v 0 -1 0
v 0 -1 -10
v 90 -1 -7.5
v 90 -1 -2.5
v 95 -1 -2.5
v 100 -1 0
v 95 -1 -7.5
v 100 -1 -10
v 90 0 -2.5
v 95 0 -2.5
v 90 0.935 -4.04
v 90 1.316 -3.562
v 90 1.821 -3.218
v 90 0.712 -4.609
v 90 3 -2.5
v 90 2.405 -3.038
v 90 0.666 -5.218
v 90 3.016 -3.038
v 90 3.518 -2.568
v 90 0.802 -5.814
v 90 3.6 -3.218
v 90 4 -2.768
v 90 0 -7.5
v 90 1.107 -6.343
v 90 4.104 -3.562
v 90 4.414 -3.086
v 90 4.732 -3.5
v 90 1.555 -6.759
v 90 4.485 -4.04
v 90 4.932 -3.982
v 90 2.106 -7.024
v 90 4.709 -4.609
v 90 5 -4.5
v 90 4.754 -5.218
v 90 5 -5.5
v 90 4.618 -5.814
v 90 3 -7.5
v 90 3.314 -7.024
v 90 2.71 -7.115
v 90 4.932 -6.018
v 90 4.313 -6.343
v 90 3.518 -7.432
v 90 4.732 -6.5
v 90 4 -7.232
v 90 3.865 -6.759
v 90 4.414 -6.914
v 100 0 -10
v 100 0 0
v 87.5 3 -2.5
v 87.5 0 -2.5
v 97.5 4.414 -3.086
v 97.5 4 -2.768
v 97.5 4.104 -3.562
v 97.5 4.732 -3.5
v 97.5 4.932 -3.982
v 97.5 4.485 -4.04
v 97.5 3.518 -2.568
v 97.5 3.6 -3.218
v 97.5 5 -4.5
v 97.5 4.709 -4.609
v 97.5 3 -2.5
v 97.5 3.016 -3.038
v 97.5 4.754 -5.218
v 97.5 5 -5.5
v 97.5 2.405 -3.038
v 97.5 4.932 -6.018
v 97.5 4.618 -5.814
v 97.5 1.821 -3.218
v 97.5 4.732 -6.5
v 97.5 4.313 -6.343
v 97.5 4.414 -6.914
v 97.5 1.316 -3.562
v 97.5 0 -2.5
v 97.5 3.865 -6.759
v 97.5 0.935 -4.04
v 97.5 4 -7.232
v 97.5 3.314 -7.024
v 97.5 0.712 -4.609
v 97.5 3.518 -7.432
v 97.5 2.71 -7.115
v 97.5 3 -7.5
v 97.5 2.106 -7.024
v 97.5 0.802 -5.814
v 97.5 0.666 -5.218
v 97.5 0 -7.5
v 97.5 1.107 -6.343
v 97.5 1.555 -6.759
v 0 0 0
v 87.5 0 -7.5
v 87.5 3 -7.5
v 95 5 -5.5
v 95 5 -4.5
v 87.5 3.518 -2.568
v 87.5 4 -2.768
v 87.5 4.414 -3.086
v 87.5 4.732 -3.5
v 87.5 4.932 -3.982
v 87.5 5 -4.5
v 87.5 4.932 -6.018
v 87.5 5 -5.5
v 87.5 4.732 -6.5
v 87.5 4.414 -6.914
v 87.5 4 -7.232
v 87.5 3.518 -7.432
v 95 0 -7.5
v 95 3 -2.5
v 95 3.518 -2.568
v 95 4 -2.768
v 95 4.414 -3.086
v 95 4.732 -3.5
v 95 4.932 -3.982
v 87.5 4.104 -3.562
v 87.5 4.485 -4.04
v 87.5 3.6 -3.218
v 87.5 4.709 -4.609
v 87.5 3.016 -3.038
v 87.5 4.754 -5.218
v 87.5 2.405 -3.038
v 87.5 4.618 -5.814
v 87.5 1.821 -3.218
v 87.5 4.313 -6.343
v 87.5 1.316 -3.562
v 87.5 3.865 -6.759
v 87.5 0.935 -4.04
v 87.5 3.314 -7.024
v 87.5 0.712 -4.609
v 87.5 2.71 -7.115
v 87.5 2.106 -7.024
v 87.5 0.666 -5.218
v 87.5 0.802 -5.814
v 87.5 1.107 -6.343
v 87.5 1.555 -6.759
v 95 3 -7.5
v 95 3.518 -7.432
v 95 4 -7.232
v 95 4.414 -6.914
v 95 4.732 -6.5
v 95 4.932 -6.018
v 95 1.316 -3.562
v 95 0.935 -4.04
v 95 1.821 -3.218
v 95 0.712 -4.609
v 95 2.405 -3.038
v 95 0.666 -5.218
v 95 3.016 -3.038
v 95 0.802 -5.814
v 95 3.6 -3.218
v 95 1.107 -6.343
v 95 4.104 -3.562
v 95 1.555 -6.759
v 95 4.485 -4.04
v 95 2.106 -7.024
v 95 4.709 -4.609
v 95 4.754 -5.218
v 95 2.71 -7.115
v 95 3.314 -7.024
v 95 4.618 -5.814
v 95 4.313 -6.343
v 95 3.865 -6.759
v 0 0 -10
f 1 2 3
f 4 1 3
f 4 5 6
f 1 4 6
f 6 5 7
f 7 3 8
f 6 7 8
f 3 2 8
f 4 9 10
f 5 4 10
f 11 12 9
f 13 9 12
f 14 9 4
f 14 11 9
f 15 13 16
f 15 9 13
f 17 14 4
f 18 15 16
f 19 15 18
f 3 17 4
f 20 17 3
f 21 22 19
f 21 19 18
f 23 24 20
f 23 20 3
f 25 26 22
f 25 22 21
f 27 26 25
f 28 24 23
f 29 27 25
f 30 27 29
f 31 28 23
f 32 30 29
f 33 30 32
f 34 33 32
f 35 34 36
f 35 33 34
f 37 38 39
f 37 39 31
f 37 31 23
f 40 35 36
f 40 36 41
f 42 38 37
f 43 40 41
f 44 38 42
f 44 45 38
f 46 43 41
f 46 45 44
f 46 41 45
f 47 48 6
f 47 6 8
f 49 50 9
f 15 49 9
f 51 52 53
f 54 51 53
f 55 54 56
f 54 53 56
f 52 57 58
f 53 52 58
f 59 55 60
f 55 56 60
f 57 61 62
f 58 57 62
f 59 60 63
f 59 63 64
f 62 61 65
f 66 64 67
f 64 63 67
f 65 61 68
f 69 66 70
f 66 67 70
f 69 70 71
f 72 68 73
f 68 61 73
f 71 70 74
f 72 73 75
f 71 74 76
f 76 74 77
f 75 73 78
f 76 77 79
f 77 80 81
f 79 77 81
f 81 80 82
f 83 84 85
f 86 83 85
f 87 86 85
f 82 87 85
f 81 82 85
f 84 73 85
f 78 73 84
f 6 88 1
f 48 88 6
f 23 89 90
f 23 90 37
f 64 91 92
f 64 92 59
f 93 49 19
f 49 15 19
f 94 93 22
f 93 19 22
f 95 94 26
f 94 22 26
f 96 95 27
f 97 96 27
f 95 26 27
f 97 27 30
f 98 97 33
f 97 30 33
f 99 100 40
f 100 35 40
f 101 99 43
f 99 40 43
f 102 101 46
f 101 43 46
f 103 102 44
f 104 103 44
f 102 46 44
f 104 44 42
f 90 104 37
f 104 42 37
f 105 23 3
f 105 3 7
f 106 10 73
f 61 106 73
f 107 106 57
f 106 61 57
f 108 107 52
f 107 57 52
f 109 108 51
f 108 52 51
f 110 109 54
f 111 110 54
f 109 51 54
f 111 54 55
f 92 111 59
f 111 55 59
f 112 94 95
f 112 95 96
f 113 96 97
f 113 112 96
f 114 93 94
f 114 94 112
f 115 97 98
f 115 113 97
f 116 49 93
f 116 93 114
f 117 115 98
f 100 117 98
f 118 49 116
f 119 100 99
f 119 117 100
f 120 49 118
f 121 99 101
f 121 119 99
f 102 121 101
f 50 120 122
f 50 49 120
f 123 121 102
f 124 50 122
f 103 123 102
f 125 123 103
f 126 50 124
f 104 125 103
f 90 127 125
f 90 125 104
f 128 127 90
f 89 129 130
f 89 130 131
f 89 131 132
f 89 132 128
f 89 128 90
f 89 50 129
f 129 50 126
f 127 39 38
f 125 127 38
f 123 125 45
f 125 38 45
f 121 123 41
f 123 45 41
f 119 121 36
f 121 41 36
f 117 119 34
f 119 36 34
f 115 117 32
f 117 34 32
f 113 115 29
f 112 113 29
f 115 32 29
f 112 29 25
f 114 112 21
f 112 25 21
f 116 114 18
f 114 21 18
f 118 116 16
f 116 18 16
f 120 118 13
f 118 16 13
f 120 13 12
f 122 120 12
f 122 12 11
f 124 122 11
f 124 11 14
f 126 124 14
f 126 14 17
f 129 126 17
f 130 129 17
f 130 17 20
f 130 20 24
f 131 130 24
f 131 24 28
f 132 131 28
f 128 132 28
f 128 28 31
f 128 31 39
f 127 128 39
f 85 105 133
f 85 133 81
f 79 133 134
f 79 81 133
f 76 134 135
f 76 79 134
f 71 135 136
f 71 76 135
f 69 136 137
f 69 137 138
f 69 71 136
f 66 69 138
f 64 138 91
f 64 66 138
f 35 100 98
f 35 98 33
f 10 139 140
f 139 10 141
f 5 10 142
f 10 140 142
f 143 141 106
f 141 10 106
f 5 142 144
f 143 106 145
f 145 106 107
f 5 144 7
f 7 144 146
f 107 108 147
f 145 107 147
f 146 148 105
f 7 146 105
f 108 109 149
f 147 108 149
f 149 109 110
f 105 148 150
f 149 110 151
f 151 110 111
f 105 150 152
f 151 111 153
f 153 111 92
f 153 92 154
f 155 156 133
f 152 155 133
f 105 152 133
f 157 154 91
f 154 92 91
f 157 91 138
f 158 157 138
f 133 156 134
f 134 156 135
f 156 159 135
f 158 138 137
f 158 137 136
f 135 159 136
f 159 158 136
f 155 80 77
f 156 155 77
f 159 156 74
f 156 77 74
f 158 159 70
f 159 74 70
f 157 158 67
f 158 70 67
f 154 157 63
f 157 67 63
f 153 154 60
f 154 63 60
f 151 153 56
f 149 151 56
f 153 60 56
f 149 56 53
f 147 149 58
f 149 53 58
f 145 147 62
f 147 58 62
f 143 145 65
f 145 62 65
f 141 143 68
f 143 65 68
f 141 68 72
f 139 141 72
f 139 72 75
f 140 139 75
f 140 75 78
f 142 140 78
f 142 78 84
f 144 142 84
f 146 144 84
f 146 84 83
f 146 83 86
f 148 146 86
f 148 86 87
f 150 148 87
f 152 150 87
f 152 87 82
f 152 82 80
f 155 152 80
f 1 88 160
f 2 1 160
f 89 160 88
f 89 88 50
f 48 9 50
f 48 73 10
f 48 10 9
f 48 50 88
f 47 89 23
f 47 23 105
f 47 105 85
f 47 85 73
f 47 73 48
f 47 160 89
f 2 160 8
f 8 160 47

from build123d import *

# Parameters (mm, degrees)
SKETCH1_W             = 2.5
SKETCH1_H             = 5
BOSS_EXTRUDE1_DEPTH   = 5
BOSS_EXTRUDE1_2_DEPTH = 5
SKETCH1_3_W           = 100
SKETCH1_3_H           = 10
BOSS_EXTRUDE2_DEPTH   = 1
SKETCH1_4_W           = 2.5
SKETCH1_4_H           = 5
BOSS_EXTRUDE3_DEPTH   = 1
SKETCH2_R             = 2.05
CUT_EXTRUDE1_DEPTH    = 99.138932132
FILLET1_R             = 2


with BuildPart() as part:
    # Sketch1 → Boss-Extrude1 (new body)
    with BuildSketch(Plane(origin=(0, 0, 0), x_dir=(1, 0, 0), z_dir=(0, 1, 0))):
        with Locations((88.75, 5)):
            Rectangle(SKETCH1_W, SKETCH1_H)
    extrude(amount=BOSS_EXTRUDE1_DEPTH)



with BuildPart() as body_2:
    # Sketch1 → Boss-Extrude1 2 (new body)
    with BuildSketch(Plane(origin=(0, 0, 0), x_dir=(1, 0, 0), z_dir=(0, 1, 0))):
        with Locations((96.25, 5)):
            Rectangle(SKETCH1_W, SKETCH1_H)
    extrude(amount=BOSS_EXTRUDE1_2_DEPTH)


with BuildPart() as body_3:
    # Sketch1<3> → Boss-Extrude2 (new body)
    with BuildSketch(Plane(origin=(0, 0, 0), x_dir=(1, 0, 0), z_dir=(0, 1, 0))):
        with Locations((50, 5)):
            Rectangle(SKETCH1_3_W, SKETCH1_3_H)
        Polygon((90, 2.5), (87.5, 2.5), (87.5, 7.5), (90, 7.5), (95, 7.5), (97.5, 7.5), (97.5, 2.5), (95, 2.5), align=None, mode=Mode.SUBTRACT)
    extrude(amount=-BOSS_EXTRUDE2_DEPTH)


with BuildPart() as part_1:
    add(part.part)

    add(body_2.part)  # Boss-Extrude3 merges body 2

    add(body_3.part)  # Boss-Extrude3 merges body 3
    # Sketch1<4> → Boss-Extrude3 (add)
    with BuildSketch(Plane(origin=(0, 0, 0), x_dir=(1, 0, 0), z_dir=(0, 1, 0))):
        with Locations((88.75, 5)):
            Rectangle(SKETCH1_4_W, SKETCH1_4_H)
        with Locations((96.25, 5)):
            Rectangle(SKETCH1_4_W, SKETCH1_4_H)
    extrude(amount=-BOSS_EXTRUDE3_DEPTH)

    # Sketch2 → Cut-Extrude1 (cut, through all)
    with BuildSketch(Plane(origin=(97.5, 0, 0), x_dir=(0, 0, -1), z_dir=(1, 0, 0))):
        with Locations((5.065113553, 2.710102322)):
            Circle(SKETCH2_R)
    extrude(amount=-CUT_EXTRUDE1_DEPTH, mode=Mode.SUBTRACT)

    # Fillet1
    fillet1_edges = [part_1.edges().sort_by_distance(p)[0] for p in [
        (96.25, 5, -7.5),
        (88.75, 5, -7.5),
        (96.25, 5, -2.5),
        (88.75, 5, -2.5),
    ]]
    fillet(fillet1_edges, radius=FILLET1_R)


solid = part_1.part
